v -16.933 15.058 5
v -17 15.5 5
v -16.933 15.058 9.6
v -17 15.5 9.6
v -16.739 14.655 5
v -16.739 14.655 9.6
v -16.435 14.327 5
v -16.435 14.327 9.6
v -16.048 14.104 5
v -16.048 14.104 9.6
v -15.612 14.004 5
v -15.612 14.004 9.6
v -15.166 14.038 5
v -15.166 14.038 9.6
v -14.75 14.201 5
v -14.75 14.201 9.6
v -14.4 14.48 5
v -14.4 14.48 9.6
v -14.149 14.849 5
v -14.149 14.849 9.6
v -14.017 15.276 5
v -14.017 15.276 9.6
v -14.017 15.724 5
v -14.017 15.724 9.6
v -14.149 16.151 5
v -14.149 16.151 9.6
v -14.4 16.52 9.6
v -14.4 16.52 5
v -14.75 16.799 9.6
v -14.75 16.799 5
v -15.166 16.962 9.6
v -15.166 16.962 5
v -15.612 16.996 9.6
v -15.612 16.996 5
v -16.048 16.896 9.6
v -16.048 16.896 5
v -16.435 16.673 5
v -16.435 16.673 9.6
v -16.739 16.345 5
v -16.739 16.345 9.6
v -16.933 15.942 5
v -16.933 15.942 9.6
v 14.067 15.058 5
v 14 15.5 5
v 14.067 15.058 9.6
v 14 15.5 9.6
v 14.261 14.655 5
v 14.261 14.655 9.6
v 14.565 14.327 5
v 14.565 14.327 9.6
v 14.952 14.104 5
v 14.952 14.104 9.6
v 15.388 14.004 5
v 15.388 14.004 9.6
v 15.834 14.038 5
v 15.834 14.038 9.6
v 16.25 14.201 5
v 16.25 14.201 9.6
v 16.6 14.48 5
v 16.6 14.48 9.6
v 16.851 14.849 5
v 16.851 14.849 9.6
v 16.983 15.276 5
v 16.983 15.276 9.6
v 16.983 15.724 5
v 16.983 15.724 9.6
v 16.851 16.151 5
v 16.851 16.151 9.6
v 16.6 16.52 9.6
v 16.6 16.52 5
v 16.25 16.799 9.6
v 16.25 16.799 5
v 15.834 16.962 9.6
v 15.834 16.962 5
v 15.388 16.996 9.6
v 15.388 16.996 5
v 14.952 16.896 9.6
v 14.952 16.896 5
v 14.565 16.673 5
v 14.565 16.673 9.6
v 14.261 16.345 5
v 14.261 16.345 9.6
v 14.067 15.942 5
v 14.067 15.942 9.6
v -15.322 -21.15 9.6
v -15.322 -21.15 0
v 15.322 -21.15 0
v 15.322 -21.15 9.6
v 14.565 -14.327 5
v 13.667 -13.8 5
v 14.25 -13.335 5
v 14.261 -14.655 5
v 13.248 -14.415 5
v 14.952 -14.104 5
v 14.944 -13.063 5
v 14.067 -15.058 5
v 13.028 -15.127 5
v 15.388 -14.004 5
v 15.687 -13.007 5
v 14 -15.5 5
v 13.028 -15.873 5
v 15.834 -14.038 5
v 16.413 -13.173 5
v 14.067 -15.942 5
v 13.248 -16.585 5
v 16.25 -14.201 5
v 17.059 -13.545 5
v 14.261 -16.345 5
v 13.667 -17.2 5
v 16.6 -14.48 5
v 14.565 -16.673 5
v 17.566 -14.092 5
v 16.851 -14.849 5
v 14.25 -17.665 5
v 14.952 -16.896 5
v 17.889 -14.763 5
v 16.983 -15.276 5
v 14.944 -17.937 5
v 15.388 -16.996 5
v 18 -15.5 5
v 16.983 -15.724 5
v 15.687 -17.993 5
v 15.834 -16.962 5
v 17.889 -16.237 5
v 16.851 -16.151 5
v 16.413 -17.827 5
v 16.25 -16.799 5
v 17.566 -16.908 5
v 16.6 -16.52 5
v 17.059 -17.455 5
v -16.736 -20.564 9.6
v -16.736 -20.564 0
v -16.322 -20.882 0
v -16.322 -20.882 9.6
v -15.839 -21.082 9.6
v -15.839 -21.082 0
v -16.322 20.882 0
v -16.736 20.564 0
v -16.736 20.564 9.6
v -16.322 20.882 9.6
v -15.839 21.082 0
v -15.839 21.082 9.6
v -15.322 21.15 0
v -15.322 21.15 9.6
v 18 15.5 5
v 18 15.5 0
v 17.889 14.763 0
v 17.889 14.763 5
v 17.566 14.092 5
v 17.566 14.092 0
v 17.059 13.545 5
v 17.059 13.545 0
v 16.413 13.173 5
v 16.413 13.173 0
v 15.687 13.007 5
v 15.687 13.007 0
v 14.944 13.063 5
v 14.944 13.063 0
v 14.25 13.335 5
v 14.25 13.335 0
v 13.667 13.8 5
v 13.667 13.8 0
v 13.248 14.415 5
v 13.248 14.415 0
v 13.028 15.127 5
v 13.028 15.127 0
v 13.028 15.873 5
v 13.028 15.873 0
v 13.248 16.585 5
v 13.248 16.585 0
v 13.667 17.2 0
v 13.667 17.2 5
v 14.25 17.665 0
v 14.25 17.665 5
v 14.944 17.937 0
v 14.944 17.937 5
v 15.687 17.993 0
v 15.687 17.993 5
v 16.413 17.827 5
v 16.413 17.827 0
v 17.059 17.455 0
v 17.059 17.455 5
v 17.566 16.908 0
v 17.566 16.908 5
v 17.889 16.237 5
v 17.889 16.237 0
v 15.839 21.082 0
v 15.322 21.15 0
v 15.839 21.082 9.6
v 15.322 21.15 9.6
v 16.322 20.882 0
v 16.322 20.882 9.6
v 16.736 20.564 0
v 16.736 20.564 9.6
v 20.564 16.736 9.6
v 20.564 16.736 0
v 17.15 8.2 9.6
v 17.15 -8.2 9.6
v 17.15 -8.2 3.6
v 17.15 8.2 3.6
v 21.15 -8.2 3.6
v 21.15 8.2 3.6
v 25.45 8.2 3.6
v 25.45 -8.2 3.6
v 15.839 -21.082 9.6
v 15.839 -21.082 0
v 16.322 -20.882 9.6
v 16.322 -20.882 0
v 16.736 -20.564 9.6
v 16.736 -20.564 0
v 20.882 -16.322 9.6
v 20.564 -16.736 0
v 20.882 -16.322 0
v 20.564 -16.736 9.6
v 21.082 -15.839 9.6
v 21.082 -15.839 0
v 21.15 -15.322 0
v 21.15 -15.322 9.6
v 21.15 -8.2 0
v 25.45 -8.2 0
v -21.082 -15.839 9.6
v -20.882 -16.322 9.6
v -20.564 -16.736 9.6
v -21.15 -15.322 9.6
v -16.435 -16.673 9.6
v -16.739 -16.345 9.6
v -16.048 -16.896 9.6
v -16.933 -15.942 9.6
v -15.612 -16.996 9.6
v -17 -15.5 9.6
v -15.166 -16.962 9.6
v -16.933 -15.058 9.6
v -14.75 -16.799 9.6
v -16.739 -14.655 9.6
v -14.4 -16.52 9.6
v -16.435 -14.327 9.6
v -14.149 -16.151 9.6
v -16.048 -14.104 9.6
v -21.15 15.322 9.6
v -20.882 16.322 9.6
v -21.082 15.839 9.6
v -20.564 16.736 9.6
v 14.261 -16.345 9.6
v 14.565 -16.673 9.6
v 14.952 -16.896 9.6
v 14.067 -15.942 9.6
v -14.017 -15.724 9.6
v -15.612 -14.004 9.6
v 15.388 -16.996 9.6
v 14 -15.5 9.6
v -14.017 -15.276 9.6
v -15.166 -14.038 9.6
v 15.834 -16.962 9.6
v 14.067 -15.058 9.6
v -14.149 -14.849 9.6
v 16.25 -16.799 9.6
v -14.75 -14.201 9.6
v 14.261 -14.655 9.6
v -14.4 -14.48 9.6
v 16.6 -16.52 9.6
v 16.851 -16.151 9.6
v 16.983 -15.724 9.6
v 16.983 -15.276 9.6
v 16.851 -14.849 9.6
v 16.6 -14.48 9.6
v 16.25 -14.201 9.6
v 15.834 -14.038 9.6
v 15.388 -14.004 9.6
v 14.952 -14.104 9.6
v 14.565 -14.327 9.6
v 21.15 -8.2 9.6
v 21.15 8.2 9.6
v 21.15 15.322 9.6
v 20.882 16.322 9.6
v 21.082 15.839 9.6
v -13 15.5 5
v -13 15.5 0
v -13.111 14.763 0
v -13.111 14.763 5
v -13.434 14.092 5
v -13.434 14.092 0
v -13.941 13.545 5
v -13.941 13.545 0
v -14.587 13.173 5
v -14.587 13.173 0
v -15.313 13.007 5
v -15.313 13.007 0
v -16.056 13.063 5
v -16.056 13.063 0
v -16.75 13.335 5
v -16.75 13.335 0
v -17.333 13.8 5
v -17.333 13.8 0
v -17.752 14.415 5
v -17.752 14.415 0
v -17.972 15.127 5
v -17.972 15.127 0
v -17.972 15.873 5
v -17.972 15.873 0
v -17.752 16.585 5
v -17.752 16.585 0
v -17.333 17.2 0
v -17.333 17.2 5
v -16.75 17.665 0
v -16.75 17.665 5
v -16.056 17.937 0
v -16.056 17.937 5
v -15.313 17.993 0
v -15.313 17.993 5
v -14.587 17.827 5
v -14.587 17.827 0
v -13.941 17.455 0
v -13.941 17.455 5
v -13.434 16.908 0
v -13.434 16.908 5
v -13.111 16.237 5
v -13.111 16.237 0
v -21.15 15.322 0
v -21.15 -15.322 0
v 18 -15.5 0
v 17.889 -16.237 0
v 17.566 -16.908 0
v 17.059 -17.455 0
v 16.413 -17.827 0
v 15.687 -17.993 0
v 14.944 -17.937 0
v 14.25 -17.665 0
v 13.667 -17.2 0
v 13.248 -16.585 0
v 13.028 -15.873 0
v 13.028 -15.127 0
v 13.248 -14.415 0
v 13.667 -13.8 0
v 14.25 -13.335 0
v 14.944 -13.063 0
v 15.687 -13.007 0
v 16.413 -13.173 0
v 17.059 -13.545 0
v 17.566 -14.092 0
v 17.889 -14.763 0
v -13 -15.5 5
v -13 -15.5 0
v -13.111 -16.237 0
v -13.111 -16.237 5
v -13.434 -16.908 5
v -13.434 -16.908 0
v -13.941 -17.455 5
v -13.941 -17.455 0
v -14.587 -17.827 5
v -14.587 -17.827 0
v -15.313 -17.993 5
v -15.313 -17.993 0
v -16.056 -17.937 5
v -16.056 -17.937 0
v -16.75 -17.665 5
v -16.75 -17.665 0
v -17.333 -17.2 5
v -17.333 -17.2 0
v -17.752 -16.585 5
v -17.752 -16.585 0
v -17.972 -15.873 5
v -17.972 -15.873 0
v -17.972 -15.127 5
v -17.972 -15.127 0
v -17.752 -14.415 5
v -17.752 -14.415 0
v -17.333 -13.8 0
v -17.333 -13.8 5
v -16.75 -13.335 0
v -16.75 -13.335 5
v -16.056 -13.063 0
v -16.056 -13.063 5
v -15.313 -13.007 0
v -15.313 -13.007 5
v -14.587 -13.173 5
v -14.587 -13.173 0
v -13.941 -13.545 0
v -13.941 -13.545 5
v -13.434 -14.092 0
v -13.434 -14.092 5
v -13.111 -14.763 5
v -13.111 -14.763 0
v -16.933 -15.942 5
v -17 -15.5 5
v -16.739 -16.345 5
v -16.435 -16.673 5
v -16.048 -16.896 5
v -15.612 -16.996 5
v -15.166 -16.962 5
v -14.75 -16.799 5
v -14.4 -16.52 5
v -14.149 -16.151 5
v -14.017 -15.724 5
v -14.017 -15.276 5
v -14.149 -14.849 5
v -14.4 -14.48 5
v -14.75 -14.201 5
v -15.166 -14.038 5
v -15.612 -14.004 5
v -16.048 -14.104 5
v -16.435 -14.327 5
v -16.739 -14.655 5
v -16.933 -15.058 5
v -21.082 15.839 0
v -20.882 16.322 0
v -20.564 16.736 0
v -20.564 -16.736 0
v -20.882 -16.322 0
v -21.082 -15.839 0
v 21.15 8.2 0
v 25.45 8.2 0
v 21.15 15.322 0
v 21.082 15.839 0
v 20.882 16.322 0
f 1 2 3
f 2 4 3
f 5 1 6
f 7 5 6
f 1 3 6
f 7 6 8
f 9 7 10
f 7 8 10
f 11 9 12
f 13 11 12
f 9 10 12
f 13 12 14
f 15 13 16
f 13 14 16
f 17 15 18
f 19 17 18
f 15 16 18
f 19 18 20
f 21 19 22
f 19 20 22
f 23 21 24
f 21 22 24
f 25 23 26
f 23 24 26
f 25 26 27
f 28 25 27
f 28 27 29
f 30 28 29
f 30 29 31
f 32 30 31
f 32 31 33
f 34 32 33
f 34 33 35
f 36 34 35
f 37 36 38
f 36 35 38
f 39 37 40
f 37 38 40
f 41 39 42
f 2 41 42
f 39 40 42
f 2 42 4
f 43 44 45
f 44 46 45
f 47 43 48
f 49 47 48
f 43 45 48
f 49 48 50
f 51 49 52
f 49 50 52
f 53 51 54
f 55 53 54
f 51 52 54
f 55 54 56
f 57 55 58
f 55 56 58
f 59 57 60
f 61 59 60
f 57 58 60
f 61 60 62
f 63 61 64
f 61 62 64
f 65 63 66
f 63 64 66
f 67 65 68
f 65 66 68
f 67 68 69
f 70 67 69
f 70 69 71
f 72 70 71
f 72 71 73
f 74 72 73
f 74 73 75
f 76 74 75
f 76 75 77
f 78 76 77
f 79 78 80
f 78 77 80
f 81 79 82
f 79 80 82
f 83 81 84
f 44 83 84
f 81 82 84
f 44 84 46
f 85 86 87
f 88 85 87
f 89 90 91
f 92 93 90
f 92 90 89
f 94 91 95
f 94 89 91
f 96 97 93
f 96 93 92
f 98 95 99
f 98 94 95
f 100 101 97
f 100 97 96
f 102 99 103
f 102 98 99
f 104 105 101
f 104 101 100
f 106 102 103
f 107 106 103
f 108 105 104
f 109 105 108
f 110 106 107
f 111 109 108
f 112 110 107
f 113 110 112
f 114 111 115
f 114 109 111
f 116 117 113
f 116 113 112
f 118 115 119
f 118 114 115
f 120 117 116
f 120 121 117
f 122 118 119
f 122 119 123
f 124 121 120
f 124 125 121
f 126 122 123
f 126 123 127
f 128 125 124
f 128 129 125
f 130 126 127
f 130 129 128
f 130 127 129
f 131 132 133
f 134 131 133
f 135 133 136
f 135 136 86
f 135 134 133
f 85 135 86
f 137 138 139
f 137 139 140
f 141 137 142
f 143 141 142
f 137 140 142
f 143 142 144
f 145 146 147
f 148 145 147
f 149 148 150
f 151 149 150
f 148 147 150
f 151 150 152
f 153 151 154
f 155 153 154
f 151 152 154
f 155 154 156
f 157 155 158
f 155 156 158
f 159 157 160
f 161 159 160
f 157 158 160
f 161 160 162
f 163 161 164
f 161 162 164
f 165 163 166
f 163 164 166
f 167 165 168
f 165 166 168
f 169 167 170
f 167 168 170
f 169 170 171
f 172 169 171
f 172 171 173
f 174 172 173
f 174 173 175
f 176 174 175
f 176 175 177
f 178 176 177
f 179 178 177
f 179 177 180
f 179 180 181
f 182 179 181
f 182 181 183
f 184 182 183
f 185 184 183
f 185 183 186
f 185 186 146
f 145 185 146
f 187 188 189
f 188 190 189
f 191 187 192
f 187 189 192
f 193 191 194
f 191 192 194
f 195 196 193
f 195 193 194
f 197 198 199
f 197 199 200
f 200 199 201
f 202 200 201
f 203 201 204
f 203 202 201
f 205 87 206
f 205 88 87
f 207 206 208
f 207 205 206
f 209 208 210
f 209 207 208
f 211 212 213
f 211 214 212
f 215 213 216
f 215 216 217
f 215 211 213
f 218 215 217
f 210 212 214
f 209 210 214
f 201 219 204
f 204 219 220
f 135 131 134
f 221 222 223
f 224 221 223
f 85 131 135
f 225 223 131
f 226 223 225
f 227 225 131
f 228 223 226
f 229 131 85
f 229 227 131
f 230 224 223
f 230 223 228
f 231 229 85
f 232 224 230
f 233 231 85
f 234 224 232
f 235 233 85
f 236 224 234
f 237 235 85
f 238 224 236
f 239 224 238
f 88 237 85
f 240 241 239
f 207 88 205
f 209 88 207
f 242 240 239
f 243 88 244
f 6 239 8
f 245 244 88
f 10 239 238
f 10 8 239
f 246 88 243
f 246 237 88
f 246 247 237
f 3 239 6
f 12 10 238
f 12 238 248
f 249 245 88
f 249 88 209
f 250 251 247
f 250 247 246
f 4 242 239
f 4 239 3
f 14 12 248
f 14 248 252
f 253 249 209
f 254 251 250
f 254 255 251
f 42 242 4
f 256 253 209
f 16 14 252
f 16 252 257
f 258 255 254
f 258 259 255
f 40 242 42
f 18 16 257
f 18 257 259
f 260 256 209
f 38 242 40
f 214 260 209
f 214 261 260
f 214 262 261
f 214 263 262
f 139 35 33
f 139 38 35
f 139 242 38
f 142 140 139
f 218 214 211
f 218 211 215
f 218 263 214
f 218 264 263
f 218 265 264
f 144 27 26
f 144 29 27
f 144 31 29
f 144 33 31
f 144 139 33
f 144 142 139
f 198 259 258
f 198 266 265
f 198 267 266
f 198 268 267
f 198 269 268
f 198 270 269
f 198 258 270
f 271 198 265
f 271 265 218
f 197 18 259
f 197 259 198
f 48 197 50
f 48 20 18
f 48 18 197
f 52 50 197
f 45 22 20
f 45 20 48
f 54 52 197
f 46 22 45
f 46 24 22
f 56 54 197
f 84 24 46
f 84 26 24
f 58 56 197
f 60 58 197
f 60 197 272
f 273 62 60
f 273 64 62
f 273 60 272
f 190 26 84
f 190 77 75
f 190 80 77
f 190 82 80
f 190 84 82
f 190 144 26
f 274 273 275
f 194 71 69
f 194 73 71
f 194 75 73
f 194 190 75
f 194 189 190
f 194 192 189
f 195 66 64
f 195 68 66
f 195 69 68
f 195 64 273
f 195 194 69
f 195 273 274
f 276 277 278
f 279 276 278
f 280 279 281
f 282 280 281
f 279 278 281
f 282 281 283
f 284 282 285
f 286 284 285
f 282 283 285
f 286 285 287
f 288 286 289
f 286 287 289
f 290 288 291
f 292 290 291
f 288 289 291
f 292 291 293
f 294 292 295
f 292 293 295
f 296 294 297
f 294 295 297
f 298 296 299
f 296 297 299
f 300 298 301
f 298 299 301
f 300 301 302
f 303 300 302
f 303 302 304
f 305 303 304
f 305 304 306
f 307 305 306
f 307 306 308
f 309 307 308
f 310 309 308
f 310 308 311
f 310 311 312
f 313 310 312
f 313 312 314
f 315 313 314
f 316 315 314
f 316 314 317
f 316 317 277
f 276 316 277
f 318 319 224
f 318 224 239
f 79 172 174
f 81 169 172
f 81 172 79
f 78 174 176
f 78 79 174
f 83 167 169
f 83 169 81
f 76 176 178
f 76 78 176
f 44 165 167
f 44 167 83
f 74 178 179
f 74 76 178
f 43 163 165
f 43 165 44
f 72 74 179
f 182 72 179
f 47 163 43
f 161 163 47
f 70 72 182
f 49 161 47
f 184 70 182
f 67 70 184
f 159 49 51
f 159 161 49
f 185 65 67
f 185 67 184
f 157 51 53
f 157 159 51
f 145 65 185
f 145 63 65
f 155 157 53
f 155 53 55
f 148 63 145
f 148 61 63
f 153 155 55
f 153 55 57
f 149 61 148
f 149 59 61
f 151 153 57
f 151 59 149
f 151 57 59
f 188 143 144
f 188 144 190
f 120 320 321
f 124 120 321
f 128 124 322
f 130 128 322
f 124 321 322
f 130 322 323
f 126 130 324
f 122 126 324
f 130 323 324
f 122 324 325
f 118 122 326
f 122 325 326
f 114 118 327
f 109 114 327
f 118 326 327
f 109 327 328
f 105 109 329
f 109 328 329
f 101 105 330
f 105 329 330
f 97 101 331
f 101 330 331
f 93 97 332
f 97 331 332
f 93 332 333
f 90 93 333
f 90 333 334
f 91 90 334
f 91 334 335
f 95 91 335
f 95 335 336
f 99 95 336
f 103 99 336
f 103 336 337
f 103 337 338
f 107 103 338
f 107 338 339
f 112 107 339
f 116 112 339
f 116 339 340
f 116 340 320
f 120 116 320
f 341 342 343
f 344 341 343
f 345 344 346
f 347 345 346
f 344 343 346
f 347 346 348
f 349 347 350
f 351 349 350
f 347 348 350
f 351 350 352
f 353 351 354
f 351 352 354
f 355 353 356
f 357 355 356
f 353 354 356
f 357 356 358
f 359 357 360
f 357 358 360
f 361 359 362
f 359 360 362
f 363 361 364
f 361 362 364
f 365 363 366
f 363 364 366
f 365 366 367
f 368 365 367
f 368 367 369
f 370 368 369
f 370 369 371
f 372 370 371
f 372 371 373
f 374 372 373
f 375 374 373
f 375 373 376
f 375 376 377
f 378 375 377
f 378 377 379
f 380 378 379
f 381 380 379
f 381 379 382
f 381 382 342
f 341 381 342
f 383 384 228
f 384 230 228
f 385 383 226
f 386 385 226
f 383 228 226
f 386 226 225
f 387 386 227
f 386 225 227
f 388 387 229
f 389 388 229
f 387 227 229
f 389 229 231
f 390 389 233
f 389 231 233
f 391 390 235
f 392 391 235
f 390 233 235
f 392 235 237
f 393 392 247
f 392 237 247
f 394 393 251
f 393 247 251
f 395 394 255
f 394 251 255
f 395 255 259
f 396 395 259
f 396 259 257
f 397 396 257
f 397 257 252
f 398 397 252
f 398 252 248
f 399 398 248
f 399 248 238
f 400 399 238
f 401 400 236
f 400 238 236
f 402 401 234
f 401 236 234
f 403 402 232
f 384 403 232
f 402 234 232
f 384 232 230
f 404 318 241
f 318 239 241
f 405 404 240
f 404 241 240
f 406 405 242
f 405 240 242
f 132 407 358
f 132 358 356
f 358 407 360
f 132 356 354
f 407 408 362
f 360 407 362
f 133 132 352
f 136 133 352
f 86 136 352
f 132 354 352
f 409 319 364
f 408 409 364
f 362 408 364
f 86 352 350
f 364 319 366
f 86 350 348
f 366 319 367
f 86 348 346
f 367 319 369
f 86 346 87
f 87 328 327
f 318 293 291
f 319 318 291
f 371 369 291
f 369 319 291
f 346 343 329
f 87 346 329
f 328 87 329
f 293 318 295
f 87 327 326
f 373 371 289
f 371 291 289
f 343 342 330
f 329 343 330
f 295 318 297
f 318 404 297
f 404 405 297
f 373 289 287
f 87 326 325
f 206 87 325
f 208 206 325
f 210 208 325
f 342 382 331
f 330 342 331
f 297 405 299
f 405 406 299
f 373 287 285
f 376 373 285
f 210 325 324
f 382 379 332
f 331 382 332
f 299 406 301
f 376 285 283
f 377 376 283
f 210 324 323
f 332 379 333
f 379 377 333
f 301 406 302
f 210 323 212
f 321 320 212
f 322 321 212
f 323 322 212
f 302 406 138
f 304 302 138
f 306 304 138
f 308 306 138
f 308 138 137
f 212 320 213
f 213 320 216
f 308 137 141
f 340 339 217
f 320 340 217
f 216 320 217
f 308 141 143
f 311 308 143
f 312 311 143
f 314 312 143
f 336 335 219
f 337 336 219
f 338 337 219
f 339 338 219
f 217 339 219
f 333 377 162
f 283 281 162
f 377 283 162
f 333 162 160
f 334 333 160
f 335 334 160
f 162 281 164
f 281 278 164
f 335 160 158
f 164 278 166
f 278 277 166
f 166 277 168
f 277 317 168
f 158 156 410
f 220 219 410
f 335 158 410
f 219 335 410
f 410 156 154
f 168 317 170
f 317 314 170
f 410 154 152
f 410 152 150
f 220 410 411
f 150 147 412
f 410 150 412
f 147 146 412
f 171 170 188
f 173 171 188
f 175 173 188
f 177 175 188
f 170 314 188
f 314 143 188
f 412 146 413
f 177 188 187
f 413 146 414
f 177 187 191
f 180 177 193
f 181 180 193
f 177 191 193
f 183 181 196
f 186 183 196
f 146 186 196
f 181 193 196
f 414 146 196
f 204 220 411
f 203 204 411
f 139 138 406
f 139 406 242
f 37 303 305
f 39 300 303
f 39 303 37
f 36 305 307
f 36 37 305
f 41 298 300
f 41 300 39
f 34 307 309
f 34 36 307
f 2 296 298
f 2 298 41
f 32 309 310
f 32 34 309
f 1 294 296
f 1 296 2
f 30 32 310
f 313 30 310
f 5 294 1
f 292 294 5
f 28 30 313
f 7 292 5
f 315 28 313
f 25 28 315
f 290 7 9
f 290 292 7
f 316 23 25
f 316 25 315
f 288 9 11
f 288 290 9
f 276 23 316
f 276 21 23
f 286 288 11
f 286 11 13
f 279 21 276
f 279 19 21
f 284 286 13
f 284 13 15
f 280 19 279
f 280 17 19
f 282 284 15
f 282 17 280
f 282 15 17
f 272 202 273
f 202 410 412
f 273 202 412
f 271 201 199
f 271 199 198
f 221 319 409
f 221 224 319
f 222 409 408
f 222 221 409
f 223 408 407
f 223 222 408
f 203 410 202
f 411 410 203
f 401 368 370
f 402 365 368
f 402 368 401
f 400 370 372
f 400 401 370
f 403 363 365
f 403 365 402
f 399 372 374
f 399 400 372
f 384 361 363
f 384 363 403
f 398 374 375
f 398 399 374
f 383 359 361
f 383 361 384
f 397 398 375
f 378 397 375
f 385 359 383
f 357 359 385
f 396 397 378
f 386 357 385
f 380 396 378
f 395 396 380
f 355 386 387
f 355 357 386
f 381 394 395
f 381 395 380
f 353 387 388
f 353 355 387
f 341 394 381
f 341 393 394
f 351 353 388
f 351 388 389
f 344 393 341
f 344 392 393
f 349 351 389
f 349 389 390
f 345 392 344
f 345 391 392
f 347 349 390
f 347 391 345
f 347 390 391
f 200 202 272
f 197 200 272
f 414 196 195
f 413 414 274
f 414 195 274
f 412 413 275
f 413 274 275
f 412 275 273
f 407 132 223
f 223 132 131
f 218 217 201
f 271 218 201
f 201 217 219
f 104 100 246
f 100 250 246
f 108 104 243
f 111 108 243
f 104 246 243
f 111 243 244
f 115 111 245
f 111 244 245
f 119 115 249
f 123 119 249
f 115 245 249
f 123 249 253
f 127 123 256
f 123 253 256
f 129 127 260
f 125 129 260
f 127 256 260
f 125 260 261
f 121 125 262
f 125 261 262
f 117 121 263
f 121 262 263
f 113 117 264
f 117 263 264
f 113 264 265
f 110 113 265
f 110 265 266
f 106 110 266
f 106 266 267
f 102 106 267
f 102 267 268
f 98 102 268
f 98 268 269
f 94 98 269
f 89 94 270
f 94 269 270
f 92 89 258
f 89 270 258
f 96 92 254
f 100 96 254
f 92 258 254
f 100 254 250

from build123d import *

# Parameters (mm, degrees)
SKETCH116_W      = 42.3
SKETCH116_H      = 42.3
PAD048_DEPTH     = 9.6
SKETCH118_W      = 4.3
SKETCH118_H      = 16.4
PAD001_DEPTH     = 3.6
CHAMFER005_SIZE  = 5
FILLET_R         = 2
HOLE_D           = 3
HOLE_DEPTH       = 25
HOLE_CBORE_D     = 5
HOLE_CBORE_DEPTH = 5
SKETCH013_W      = 16.4
SKETCH013_H      = 6
POCKET013_DEPTH  = 4


with BuildPart() as part:
    # Sketch116 → Pad048 (new body)
    with BuildSketch(Plane.XY):
        Rectangle(SKETCH116_W, SKETCH116_H)
    extrude(amount=PAD048_DEPTH)

    # Sketch118 → Pad001 (join)
    with BuildSketch(Plane.XY):
        with Locations((23.3, 0)):
            Rectangle(SKETCH118_W, SKETCH118_H)
    extrude(amount=PAD001_DEPTH)

    # Chamfer005
    chamfer005_edges = [part.edges().sort_by_distance(p)[0] for p in [
        (21.15, -21.15, 4.8),
        (-21.15, -21.15, 4.8),
        (-21.15, 21.15, 4.8),
        (21.15, 21.15, 4.8),
    ]]
    chamfer(chamfer005_edges, length=CHAMFER005_SIZE)

    # Fillet
    fillet_edges = [part.edges().sort_by_distance(p)[0] for p in [
        (16.15, -21.15, 4.8),
        (21.15, -16.15, 4.8),
        (21.15, 16.15, 4.8),
        (16.15, 21.15, 4.8),
        (-16.15, 21.15, 4.8),
        (-21.15, 16.15, 4.8),
        (-16.15, -21.15, 4.8),
        (-21.15, -16.15, 4.8),
    ]]
    fillet(fillet_edges, radius=FILLET_R)

    # Hole
    with Locations(Plane(origin=(0, 0, 0), x_dir=(1, 0, 0), z_dir=(0, 0, -1))):
        with Locations((-15.5, 15.5), (15.5, 15.5), (15.5, -15.5), (-15.5, -15.5)):
            CounterBoreHole(HOLE_D / 2, HOLE_CBORE_D / 2, HOLE_CBORE_DEPTH, depth=HOLE_DEPTH)

    # Sketch013 (on Face11 of Hole) → Pocket013 (cut)
    with BuildSketch(Plane.YZ.offset(21.15)):
        with Locations((0, 6.6)):
            Rectangle(SKETCH013_W, SKETCH013_H)
    extrude(amount=-POCKET013_DEPTH, mode=Mode.SUBTRACT)


solid = part.part
